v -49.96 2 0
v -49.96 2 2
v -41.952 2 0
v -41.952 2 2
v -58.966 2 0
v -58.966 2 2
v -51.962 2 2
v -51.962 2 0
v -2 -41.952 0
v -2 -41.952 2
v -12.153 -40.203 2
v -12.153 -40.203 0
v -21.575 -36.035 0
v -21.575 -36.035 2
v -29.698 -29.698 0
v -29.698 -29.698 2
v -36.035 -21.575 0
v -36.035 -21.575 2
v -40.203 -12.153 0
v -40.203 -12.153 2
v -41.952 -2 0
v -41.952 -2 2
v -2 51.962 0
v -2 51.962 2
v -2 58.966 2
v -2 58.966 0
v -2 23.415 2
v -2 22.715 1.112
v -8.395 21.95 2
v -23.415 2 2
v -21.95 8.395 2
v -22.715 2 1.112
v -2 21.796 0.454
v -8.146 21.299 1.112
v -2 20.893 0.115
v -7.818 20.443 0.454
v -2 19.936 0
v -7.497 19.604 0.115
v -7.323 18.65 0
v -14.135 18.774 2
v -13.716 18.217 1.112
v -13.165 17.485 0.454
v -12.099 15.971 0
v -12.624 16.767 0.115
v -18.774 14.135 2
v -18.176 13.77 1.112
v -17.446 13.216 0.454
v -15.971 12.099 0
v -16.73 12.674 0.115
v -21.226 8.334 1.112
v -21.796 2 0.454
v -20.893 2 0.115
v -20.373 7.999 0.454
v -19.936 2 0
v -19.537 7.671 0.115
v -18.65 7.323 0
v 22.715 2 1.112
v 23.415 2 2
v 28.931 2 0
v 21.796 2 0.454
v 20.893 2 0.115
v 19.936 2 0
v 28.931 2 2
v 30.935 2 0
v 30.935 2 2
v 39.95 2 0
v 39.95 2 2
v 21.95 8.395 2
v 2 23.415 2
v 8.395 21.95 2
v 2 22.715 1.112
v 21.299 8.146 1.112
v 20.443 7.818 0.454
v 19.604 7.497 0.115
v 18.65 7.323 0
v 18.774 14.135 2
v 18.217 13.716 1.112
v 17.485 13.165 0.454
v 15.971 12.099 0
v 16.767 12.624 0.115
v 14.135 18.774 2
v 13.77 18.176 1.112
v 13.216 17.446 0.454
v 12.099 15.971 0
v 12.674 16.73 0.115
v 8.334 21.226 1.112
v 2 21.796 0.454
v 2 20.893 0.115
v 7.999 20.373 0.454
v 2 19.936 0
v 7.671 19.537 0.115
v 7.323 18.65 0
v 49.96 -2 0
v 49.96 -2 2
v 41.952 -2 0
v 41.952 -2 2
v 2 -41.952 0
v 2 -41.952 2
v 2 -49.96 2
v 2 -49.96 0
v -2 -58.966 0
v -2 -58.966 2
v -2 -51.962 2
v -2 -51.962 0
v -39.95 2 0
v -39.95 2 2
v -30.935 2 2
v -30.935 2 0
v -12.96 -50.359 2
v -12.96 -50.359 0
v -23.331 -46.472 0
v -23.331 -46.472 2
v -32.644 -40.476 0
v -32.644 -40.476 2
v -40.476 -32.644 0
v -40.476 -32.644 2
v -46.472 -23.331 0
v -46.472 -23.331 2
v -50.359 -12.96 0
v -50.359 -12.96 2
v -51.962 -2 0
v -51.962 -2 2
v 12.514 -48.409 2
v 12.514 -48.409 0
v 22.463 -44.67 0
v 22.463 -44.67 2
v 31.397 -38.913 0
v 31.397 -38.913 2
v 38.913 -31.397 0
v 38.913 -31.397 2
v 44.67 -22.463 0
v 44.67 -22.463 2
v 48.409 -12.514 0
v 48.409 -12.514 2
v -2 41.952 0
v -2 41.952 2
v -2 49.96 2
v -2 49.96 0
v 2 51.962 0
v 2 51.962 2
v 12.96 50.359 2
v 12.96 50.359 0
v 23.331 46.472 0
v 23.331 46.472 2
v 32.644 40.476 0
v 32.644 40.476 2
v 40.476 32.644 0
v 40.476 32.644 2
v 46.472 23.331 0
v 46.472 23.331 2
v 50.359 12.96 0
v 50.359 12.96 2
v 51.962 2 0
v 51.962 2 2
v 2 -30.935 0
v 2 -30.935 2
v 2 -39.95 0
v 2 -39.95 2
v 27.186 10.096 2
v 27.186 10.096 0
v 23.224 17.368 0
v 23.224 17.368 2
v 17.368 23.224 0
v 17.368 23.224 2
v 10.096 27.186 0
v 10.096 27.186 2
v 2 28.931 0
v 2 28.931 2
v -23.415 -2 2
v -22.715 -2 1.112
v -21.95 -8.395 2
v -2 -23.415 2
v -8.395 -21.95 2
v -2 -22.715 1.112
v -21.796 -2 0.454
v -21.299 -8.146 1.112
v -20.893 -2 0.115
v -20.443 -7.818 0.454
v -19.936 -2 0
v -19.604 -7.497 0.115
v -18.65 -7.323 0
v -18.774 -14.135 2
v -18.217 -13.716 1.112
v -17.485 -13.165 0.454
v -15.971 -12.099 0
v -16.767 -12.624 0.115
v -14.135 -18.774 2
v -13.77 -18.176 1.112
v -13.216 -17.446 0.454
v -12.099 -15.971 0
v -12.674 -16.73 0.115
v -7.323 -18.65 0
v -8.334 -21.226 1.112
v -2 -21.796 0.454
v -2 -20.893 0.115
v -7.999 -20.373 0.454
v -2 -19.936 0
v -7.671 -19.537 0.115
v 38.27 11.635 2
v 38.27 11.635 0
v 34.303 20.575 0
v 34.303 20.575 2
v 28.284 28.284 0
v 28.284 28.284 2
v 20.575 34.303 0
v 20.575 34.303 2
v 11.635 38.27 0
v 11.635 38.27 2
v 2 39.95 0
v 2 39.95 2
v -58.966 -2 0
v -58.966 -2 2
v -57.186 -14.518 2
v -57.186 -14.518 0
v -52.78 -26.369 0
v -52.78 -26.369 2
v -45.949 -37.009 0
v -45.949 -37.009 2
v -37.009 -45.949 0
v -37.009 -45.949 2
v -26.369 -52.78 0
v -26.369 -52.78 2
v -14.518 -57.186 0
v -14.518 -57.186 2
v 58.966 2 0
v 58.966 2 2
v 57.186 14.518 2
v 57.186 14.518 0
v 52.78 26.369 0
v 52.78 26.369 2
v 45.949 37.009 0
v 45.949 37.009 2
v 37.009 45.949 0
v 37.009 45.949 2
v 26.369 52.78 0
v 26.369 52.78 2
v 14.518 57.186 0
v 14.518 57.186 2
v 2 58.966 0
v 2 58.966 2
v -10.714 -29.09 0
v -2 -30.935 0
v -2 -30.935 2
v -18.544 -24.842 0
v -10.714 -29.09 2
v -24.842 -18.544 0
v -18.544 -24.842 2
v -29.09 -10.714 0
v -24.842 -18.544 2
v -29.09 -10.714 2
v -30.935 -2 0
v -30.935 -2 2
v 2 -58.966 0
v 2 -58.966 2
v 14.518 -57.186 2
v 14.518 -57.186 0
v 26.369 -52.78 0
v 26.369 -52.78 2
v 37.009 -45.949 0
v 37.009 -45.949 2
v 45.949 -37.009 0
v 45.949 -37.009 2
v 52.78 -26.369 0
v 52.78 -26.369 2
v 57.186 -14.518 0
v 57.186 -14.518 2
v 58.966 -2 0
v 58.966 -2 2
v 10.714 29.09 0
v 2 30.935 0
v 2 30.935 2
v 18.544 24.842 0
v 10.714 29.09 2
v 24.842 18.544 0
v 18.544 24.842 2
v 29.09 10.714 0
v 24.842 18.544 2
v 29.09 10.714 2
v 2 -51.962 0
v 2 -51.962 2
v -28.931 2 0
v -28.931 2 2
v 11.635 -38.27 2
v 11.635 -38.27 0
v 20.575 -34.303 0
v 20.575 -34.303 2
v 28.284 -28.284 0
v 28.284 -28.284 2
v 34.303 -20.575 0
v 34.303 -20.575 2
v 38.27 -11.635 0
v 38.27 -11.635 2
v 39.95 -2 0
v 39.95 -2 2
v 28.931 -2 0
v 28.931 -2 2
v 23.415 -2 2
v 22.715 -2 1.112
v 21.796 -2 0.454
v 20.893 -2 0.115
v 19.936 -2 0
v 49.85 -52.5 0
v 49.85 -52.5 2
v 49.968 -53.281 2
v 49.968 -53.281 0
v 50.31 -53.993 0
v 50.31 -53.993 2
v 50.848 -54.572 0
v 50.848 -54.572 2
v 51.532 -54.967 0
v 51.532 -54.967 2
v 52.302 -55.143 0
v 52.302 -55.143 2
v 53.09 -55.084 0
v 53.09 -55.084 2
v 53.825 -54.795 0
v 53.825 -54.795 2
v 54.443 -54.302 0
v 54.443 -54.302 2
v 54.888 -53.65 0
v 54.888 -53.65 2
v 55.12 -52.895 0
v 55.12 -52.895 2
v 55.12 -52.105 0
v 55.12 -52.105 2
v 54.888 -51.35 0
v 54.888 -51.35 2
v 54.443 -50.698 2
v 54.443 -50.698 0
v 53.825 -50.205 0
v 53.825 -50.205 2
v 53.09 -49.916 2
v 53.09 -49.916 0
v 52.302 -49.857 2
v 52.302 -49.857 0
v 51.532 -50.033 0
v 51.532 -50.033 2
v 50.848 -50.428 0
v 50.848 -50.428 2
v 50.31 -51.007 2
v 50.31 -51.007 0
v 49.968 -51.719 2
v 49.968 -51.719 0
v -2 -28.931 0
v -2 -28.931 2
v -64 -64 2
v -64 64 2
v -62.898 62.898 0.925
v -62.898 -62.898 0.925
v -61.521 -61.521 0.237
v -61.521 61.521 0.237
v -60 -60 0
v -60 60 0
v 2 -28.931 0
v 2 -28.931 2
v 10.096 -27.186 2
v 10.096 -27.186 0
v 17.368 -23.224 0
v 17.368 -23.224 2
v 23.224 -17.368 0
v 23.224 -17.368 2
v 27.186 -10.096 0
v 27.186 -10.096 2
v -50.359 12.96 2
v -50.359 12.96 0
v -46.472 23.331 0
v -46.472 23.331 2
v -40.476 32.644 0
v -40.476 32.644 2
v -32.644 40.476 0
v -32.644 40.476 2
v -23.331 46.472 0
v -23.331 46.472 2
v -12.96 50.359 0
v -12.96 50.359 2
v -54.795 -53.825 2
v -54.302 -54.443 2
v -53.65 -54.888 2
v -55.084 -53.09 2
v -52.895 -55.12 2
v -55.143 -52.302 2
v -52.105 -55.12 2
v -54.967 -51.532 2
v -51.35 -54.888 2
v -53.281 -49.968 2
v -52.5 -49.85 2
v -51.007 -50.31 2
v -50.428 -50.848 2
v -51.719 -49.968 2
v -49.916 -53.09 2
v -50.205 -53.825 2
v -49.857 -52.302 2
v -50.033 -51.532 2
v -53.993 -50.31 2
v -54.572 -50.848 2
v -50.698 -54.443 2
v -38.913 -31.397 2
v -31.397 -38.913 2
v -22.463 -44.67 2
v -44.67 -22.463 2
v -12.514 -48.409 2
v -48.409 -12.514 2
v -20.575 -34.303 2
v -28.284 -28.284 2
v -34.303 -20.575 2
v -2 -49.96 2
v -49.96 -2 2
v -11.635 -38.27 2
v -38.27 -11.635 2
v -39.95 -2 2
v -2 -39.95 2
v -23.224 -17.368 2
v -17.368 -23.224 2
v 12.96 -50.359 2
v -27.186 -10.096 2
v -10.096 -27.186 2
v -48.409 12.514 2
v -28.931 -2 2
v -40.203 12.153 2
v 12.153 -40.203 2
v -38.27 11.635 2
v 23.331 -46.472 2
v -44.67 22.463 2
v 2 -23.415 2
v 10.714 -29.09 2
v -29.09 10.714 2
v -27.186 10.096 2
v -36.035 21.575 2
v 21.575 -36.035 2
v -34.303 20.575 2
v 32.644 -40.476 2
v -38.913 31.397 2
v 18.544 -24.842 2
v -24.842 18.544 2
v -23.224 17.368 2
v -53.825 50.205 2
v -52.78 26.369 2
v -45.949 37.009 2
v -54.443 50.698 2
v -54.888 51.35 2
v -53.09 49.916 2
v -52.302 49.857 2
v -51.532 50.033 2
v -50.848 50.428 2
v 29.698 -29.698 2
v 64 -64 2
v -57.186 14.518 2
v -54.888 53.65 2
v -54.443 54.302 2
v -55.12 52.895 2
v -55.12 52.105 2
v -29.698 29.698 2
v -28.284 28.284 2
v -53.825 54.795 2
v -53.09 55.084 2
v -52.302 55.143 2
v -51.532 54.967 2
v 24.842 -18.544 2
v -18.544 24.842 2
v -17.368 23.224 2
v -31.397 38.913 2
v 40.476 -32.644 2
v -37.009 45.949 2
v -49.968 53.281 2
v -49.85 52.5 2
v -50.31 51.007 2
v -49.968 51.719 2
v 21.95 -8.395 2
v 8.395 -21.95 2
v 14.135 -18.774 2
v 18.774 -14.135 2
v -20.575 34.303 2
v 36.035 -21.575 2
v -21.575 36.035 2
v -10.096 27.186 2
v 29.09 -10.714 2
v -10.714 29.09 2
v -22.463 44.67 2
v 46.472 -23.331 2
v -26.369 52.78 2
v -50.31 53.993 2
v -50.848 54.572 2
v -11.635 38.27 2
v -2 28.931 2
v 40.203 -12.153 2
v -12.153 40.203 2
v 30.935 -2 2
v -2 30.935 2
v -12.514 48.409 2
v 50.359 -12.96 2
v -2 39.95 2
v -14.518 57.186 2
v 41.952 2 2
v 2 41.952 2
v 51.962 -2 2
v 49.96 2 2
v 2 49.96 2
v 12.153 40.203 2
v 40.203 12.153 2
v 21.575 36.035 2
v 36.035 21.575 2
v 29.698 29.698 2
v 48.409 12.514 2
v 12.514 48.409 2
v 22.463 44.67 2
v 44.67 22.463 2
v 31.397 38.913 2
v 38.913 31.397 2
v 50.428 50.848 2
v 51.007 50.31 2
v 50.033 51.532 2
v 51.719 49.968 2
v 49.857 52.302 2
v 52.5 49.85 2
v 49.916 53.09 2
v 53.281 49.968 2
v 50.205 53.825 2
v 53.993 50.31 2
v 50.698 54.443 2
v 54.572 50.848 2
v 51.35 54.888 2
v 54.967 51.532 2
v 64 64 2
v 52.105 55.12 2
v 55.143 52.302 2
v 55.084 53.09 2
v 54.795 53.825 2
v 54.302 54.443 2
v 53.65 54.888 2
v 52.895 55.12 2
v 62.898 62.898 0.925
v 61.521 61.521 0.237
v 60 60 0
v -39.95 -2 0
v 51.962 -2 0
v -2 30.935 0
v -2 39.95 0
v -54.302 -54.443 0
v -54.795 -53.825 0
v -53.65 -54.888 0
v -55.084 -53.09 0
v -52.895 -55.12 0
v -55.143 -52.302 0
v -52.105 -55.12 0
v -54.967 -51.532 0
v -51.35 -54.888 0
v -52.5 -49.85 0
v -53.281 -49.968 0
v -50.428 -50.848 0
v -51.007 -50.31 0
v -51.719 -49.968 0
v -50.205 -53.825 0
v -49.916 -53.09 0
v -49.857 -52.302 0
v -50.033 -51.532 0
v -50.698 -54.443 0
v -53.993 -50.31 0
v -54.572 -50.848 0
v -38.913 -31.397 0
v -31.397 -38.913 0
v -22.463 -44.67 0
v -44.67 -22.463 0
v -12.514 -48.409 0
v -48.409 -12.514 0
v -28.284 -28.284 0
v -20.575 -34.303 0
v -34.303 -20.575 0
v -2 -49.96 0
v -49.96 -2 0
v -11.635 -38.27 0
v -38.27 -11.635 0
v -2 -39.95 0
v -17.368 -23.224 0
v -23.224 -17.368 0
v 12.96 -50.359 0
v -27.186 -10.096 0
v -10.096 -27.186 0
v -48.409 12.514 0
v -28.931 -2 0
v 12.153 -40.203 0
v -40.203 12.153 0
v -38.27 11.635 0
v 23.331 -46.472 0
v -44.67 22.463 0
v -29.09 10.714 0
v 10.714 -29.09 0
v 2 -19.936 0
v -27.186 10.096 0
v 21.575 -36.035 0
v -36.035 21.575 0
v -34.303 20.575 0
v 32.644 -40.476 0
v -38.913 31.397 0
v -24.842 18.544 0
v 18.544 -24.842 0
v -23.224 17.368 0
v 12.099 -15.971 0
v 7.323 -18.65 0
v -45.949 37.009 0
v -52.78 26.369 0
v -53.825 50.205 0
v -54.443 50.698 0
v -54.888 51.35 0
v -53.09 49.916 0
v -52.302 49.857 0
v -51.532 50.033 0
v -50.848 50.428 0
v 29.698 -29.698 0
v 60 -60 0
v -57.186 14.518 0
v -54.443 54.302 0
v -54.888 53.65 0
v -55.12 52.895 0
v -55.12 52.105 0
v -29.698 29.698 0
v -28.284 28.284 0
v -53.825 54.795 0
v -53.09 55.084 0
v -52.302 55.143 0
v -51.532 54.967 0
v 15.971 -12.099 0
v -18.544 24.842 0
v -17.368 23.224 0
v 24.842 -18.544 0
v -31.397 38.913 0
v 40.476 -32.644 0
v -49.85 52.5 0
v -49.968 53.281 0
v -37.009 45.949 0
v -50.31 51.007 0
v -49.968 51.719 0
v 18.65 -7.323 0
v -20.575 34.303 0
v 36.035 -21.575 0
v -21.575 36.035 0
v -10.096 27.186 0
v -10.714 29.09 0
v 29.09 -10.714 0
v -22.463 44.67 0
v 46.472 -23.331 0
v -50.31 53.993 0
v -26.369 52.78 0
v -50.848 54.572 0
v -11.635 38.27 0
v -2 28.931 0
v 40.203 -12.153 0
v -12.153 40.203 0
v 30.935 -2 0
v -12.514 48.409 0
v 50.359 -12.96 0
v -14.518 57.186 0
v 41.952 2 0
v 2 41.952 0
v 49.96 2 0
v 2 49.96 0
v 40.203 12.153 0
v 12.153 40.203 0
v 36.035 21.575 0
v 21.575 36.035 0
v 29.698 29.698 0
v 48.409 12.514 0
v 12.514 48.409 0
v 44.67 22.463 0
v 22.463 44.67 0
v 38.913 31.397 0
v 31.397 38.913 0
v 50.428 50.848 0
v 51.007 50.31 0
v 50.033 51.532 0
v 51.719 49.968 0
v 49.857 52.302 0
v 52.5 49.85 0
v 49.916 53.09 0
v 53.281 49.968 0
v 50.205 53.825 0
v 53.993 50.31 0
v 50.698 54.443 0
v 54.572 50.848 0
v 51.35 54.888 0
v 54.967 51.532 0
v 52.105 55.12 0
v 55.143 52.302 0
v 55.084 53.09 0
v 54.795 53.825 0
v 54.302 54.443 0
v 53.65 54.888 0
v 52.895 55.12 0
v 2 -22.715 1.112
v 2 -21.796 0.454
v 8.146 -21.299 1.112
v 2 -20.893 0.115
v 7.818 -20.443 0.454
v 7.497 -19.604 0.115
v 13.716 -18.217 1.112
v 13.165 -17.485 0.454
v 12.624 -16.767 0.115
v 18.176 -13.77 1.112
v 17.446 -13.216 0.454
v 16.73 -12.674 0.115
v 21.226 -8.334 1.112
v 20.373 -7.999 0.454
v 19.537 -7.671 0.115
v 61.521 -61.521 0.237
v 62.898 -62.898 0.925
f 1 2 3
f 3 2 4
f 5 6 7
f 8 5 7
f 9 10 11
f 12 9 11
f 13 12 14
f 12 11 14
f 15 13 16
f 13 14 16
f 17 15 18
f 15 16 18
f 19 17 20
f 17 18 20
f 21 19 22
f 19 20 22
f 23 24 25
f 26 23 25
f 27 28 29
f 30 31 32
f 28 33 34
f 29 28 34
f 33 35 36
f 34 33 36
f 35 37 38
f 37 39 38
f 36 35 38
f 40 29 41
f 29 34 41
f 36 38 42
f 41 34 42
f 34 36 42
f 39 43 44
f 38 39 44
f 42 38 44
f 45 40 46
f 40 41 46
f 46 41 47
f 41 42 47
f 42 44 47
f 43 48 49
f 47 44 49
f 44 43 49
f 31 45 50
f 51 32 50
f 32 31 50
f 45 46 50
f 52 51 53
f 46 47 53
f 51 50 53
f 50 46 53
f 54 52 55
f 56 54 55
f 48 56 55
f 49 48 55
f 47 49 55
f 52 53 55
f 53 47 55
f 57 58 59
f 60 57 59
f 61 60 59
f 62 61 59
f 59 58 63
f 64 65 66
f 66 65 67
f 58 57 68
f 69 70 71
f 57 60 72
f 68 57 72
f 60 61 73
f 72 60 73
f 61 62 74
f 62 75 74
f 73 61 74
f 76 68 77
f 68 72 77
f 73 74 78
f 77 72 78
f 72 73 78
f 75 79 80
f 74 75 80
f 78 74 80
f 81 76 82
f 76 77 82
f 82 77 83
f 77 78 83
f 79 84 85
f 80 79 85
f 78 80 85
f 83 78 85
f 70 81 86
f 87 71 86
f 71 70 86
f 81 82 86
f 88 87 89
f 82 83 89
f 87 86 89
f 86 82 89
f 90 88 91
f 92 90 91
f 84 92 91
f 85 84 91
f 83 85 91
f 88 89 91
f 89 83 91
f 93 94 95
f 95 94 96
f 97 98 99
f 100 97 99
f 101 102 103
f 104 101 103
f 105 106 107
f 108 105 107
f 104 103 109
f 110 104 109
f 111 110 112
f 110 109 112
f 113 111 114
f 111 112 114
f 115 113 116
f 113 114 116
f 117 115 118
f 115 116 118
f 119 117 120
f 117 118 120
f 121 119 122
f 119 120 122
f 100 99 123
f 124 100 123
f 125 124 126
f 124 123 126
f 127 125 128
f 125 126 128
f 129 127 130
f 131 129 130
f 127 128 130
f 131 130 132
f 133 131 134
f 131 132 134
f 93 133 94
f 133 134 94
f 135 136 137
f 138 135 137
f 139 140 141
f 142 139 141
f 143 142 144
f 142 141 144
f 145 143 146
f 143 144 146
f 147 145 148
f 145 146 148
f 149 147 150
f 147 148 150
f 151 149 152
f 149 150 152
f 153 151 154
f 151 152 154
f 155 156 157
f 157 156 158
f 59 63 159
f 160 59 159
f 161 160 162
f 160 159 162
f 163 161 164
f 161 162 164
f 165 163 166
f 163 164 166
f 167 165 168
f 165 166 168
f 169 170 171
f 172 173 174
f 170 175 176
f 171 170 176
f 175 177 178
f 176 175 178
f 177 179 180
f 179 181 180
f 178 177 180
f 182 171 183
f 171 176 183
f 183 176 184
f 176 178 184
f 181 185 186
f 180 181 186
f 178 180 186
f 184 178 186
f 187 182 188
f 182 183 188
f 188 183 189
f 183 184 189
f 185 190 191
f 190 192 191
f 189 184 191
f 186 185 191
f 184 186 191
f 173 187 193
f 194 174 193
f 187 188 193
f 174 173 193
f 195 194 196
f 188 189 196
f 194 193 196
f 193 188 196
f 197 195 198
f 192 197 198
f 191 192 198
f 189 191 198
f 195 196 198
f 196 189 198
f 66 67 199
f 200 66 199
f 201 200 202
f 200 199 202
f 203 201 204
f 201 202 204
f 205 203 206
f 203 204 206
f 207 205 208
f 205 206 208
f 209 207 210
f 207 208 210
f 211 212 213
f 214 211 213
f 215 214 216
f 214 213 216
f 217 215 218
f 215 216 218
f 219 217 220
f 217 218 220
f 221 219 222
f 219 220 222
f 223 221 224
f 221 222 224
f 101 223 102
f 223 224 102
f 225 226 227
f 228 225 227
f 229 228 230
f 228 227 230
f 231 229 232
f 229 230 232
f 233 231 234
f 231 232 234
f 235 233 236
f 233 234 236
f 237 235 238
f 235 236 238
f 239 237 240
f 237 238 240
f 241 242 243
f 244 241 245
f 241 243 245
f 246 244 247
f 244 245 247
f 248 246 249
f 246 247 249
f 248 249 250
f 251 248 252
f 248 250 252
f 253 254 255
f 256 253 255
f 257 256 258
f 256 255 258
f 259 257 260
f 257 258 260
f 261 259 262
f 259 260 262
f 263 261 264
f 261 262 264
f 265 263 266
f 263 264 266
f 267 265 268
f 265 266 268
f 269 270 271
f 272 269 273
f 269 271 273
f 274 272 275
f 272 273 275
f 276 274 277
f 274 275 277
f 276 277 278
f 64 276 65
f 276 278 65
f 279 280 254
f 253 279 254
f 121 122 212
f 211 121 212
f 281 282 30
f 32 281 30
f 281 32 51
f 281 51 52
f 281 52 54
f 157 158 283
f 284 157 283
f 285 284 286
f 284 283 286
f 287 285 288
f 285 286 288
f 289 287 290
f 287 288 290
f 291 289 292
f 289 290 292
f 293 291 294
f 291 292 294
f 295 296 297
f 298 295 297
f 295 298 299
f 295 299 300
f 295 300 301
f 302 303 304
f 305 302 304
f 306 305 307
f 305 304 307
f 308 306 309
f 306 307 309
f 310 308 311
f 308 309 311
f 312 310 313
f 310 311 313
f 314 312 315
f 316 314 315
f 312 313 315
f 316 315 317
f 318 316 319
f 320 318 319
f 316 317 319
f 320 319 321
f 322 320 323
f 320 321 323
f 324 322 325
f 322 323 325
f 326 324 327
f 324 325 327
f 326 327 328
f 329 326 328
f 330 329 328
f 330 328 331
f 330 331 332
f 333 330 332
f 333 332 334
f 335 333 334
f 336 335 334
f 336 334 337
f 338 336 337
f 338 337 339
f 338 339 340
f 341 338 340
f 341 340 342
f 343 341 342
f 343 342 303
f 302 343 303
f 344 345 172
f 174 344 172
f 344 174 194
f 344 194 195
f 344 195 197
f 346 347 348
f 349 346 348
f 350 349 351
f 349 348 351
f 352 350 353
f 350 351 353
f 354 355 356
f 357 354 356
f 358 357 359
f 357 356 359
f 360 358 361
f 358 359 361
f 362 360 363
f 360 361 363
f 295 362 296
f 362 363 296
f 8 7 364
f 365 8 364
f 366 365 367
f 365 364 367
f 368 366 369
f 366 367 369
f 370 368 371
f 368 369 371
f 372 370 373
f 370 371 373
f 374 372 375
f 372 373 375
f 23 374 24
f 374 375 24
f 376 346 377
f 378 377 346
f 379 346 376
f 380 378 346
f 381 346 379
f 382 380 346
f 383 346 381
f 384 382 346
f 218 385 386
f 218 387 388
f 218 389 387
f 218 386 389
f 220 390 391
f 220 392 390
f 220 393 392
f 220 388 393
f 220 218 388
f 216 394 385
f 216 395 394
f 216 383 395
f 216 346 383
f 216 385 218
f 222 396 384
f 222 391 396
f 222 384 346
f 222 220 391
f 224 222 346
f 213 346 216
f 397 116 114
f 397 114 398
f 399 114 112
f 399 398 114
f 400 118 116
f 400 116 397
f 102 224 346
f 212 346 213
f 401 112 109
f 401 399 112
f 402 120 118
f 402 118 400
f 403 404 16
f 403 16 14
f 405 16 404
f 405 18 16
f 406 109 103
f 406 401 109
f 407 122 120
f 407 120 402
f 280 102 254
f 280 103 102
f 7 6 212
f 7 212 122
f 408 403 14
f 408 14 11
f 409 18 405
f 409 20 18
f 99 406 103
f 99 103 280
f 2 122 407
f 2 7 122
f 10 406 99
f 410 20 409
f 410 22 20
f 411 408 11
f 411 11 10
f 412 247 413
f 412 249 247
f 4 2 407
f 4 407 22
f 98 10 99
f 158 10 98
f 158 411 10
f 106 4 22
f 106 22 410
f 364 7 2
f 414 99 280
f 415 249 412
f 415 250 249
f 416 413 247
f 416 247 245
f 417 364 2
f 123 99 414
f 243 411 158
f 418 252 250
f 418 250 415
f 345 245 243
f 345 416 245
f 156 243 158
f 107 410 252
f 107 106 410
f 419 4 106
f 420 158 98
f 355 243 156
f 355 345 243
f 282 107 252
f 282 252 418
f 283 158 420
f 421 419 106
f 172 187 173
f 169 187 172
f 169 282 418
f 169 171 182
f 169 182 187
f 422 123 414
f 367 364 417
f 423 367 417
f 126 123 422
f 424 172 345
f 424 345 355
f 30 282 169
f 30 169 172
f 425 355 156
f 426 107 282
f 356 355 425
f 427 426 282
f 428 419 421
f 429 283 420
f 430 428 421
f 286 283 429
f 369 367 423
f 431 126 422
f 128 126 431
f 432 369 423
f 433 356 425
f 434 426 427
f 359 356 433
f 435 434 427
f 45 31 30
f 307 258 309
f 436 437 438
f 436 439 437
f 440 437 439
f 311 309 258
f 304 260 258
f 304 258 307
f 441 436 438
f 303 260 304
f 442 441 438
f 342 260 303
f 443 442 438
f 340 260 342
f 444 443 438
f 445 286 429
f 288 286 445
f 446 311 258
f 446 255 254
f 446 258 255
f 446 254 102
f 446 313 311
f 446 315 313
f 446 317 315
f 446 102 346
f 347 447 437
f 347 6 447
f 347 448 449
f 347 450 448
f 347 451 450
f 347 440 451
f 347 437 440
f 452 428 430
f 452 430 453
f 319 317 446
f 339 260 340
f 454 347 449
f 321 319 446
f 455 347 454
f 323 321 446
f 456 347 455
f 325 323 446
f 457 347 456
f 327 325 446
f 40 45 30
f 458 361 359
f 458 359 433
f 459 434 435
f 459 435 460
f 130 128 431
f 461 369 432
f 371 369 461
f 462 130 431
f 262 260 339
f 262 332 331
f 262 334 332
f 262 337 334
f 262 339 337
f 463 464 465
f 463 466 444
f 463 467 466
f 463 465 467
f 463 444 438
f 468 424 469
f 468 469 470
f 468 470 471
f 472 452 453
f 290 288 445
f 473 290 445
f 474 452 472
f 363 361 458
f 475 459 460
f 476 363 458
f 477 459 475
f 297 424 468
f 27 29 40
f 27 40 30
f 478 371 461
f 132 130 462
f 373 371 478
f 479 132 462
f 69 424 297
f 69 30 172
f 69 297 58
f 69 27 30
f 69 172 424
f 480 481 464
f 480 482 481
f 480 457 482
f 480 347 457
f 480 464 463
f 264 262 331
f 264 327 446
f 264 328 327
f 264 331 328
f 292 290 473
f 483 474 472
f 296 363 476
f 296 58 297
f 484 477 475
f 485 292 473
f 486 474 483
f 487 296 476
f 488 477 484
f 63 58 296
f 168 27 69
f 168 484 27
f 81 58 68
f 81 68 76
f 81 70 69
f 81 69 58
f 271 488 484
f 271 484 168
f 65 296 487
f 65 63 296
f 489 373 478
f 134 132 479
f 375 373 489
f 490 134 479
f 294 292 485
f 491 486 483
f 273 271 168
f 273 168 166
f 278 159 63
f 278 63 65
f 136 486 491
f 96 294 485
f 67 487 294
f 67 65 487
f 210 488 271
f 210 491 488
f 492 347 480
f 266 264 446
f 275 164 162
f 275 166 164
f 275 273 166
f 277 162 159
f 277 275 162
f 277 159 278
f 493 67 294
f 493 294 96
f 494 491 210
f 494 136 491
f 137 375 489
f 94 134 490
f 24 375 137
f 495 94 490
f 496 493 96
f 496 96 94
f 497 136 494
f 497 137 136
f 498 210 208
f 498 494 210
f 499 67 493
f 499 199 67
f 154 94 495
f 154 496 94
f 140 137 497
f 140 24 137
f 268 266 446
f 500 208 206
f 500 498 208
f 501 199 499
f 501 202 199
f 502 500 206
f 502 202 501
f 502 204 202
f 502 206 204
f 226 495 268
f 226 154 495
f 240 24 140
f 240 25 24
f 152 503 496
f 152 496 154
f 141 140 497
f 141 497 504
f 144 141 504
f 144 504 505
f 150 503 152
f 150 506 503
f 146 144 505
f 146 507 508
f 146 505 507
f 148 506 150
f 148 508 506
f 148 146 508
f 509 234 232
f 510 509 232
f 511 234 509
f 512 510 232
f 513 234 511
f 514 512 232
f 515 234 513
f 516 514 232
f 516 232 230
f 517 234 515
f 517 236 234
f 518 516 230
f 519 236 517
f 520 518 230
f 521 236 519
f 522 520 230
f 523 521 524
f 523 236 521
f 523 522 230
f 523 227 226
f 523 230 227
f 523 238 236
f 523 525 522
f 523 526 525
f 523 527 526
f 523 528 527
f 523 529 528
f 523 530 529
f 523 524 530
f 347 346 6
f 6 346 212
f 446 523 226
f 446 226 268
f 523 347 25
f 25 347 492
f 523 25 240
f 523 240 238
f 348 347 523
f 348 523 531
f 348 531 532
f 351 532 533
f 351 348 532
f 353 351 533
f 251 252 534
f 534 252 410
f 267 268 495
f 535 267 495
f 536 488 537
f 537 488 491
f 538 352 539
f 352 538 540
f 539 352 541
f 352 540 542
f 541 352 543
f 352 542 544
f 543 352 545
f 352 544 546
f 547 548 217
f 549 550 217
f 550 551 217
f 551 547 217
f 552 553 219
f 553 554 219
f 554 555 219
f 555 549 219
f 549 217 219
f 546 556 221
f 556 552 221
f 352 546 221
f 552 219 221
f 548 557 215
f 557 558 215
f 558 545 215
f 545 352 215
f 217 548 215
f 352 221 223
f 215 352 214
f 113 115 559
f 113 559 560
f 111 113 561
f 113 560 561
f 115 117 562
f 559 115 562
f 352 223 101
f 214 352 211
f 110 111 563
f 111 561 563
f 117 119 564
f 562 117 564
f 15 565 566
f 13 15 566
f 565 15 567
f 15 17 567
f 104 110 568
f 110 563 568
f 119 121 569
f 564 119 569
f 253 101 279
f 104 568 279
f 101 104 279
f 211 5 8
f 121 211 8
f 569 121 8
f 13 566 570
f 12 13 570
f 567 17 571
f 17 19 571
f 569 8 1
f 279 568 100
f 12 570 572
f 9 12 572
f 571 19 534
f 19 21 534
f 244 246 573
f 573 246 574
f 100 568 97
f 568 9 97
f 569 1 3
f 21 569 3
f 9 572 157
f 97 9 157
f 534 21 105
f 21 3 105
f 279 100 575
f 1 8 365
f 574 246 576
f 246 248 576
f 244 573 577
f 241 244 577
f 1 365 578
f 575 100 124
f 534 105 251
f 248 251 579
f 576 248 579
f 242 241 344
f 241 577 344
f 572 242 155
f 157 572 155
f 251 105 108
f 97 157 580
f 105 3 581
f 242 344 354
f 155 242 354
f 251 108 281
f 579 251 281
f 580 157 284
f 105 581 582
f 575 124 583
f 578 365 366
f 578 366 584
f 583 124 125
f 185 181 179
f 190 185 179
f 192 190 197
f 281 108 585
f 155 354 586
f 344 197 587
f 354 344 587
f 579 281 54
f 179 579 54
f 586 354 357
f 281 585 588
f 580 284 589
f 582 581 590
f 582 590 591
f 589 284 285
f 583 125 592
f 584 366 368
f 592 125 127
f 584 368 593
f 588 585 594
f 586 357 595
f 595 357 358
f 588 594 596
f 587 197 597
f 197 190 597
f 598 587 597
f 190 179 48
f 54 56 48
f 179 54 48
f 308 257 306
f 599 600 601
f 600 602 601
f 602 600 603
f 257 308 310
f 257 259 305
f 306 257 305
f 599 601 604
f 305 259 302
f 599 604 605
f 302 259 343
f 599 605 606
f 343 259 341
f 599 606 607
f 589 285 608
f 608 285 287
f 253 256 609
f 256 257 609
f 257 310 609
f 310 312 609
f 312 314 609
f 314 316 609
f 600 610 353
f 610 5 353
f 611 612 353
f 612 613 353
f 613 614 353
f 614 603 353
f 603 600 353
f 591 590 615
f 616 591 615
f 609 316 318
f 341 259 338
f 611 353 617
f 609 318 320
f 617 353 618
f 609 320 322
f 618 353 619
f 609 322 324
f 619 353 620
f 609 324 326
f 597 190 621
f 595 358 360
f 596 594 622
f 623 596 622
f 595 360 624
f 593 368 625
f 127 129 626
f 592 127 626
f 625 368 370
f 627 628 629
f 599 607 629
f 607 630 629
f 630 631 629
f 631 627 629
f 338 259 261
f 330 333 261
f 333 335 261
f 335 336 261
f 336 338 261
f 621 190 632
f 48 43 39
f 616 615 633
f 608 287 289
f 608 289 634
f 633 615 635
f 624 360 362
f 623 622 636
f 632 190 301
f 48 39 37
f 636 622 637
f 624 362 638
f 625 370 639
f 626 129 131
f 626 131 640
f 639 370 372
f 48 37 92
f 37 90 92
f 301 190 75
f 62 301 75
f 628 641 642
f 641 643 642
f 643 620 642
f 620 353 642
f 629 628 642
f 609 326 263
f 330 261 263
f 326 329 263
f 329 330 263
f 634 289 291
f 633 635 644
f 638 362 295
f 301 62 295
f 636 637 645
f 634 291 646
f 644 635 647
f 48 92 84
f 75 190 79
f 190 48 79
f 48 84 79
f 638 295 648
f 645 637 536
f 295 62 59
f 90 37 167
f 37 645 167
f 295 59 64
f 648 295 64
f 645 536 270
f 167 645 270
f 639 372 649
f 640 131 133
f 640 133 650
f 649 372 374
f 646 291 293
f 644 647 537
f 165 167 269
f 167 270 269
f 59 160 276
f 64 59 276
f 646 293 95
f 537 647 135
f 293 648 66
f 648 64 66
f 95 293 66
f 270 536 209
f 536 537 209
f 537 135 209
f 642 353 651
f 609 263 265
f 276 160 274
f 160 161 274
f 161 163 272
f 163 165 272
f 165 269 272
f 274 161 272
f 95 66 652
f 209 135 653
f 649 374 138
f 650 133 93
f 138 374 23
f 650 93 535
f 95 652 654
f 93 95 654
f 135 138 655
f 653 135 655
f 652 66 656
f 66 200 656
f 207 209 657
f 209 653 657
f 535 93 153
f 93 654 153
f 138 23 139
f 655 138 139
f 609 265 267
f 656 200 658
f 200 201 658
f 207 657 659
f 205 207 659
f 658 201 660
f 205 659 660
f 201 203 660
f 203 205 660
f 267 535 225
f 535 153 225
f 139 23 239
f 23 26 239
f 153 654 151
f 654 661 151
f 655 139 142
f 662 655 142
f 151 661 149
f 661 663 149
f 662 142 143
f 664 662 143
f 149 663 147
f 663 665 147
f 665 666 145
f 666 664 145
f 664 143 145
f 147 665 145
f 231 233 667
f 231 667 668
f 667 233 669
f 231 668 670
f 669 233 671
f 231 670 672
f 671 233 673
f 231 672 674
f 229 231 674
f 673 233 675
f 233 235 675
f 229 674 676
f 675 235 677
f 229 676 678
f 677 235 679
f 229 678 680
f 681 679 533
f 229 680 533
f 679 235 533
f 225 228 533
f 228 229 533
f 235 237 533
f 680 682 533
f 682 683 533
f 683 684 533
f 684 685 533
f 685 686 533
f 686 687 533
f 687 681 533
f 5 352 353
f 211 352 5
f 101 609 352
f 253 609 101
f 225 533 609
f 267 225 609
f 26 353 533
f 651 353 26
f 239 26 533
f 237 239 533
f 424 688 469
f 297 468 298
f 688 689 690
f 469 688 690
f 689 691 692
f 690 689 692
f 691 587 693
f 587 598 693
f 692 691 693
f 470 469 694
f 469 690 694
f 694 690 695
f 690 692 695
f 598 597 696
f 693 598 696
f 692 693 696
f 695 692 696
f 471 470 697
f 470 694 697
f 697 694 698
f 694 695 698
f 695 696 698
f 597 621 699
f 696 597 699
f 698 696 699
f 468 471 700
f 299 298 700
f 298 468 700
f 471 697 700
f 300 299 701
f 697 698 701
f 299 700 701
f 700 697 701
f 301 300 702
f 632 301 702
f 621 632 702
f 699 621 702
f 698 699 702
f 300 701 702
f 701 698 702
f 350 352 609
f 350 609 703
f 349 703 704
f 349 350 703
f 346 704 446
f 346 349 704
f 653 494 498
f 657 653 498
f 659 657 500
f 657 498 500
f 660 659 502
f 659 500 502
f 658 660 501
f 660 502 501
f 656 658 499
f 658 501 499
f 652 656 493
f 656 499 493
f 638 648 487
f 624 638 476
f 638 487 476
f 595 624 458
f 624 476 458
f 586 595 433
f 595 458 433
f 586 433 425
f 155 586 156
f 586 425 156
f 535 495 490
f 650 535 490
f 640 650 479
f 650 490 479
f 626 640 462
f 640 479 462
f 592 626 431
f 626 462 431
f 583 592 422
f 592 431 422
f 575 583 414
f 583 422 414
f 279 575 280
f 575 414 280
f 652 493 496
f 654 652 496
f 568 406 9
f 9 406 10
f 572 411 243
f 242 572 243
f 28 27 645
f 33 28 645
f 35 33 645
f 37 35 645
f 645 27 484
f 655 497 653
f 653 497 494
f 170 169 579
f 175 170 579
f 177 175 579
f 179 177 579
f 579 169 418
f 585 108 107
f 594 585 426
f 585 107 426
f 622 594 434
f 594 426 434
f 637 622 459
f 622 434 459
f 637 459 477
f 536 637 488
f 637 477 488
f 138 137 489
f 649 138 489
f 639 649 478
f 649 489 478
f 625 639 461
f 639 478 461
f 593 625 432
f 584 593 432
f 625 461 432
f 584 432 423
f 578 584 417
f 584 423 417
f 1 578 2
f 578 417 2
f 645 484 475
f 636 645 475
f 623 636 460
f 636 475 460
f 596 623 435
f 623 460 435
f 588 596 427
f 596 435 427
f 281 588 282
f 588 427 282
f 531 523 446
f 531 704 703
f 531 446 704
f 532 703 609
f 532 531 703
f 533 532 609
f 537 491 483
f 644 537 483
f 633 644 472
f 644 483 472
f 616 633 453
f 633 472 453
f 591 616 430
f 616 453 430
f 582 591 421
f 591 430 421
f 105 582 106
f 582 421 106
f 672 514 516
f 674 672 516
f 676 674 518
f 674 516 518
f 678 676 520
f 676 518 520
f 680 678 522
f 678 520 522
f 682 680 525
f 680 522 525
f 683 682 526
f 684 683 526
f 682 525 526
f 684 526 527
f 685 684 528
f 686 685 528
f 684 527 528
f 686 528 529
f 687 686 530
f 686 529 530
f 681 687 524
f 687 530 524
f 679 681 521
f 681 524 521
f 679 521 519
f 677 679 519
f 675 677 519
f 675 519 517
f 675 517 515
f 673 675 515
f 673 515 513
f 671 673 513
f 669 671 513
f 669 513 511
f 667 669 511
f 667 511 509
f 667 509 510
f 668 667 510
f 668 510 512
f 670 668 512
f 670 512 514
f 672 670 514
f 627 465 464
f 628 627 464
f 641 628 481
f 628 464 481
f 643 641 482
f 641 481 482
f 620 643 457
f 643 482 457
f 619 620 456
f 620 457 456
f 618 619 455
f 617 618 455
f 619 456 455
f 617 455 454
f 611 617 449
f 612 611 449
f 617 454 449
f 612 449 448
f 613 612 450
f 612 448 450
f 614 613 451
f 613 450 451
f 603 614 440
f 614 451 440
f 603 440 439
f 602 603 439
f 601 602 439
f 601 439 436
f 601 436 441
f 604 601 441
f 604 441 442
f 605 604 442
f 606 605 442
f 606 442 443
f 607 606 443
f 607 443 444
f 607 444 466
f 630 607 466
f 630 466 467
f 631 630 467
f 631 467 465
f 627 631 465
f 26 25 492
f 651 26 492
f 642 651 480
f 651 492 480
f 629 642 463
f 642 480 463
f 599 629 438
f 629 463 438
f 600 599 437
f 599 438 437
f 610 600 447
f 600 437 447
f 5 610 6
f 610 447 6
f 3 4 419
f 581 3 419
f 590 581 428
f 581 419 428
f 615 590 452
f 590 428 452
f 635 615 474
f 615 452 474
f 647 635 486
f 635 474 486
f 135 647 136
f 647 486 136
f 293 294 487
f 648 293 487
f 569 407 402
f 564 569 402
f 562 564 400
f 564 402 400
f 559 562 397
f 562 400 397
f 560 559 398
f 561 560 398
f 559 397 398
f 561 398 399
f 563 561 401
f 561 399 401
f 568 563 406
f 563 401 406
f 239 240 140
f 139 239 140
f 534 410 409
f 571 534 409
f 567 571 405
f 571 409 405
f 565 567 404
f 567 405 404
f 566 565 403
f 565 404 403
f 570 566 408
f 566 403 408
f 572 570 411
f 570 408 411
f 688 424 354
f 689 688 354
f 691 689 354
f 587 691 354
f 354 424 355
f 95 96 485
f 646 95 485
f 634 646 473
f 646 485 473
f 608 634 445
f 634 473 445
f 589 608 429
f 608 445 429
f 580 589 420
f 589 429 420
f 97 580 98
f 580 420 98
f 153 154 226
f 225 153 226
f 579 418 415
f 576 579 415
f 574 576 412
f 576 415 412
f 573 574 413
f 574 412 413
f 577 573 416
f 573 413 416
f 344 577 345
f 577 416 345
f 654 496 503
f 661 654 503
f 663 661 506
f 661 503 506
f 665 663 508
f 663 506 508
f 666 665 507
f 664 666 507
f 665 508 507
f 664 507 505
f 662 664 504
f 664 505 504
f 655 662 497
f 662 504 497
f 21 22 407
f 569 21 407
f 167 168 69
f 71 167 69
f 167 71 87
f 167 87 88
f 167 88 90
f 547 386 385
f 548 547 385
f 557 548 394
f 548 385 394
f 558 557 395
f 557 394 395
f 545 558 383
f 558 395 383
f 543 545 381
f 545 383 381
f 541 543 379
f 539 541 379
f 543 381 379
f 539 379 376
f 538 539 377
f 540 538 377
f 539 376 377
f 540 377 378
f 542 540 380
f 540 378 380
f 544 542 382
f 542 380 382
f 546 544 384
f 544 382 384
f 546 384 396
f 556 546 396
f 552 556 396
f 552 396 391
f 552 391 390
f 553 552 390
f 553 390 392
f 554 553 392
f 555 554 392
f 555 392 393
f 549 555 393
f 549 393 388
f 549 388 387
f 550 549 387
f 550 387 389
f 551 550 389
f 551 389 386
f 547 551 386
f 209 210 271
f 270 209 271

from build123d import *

# Parameters (mm, degrees)
F0_W            = 128
F0_H            = 128
F1_DEPTH        = 2
F3_DEPTH        = 25
F4_R            = 2.65
F5_DEPTH        = 25
F5_COPIES_COUNT = 4
F6_T1_DEPTH     = 148
F6_T3_DEPTH     = 148
F7_T4_ANGLE     = 122.478644554
F7_T9_ANGLE     = 122.478644554
F7_T15_ANGLE    = 122.478644554
F7_T20_ANGLE    = 122.478644554
F7_T25_ANGLE    = 122.478644554
F7_T31_ANGLE    = 122.478644554
F7_T36_ANGLE    = 122.478644554
F7_T41_ANGLE    = 122.478644554
F7_T47_ANGLE    = 122.478644554
F7_T52_ANGLE    = 122.478644554
F7_T57_ANGLE    = 122.478644554
F7_T63_ANGLE    = 122.478644554


# Not quite as in the source:
# - a fillet or chamfer that OpenCascade refuses, or shapes differently, is made with other operations: its cross-section is extruded or revolved along the edge and cut away or added
# - a pattern or mirror of a feature is missing from the dataset's text; its kind, count and spacing are read off the source's solid
# - a feature names something its author has since deleted; it is built from what else it names


with BuildPart() as f1:
    # F0 (on Top) → F1 (new body)
    with BuildSketch(Plane.XY):
        Rectangle(F0_W, F0_H)
    extrude(amount=F1_DEPTH)

    # F2 (on face) → F3 (cut)
    with BuildSketch(Plane.XY.offset(2)):
        with BuildLine():
            Line((51.9615242271, 2), (58.9660919512, 2))
            ThreePointArc((58.9660919512, 2), (41.71930009, 41.71930009), (2, 58.9660919512))
            Line((2, 58.9660919512), (2, 51.9615242271))
            ThreePointArc((2, 51.9615242271), (36.7695526217, 36.7695526217), (51.9615242271, 2))
        make_face()
        with BuildLine():
            Line((41.9523539268, 2), (49.9599839872, 2))
            ThreePointArc((49.9599839872, 2), (35.3553390593, 35.3553390593), (2, 49.9599839872))
            Line((2, 49.9599839872), (2, 41.9523539268))
            ThreePointArc((2, 41.9523539268), (29.6984848098, 29.6984848098), (41.9523539268, 2))
        make_face()
        with BuildLine():
            Line((30.9354165965, 2), (39.9499687109, 2))
            ThreePointArc((39.9499687109, 2), (28.2842712475, 28.2842712475), (2, 39.9499687109))
            Line((2, 39.9499687109), (2, 30.9354165965))
            ThreePointArc((2, 30.9354165965), (21.9203102168, 21.9203102168), (30.9354165965, 2))
        make_face()
        with BuildLine():
            Line((23.4147389479, 2), (28.930952283, 2))
            ThreePointArc((28.930952283, 2), (20.5060966544, 20.5060966544), (2, 28.930952283))
            Line((2, 28.930952283), (2, 23.4147389479))
            ThreePointArc((2, 23.4147389479), (16.6170093579, 16.6170093579), (23.4147389479, 2))
        make_face()
        with BuildLine():
            ThreePointArc((2, -28.930952283), (20.5060966544, -20.5060966544), (28.930952283, -2))
            Line((28.930952283, -2), (23.4147389479, -2))
            ThreePointArc((23.4147389479, -2), (16.6170093579, -16.6170093579), (2, -23.4147389479))
            Line((2, -23.4147389479), (2, -28.930952283))
        make_face()
        with BuildLine():
            ThreePointArc((2, -39.9499687109), (28.2842712475, -28.2842712475), (39.9499687109, -2))
            Line((39.9499687109, -2), (30.9354165965, -2))
            ThreePointArc((30.9354165965, -2), (21.9203102168, -21.9203102168), (2, -30.9354165965))
            Line((2, -30.9354165965), (2, -39.9499687109))
        make_face()
        with BuildLine():
            ThreePointArc((2, -49.9599839872), (35.3553390593, -35.3553390593), (49.9599839872, -2))
            Line((49.9599839872, -2), (41.9523539268, -2))
            ThreePointArc((41.9523539268, -2), (29.6984848098, -29.6984848098), (2, -41.9523539268))
            Line((2, -41.9523539268), (2, -49.9599839872))
        make_face()
        with BuildLine():
            ThreePointArc((2, -58.9660919512), (41.71930009, -41.71930009), (58.9660919512, -2))
            Line((58.9660919512, -2), (51.9615242271, -2))
            ThreePointArc((51.9615242271, -2), (36.7695526217, -36.7695526217), (2, -51.9615242271))
            Line((2, -51.9615242271), (2, -58.9660919512))
        make_face()
        with BuildLine():
            ThreePointArc((-28.930952283, -2), (-20.5060966544, -20.5060966544), (-2, -28.930952283))
            Line((-2, -28.930952283), (-2, -23.4147389479))
            ThreePointArc((-2, -23.4147389479), (-16.6170093579, -16.6170093579), (-23.4147389479, -2))
            Line((-23.4147389479, -2), (-28.930952283, -2))
        make_face()
        with BuildLine():
            ThreePointArc((-39.9499687109, -2), (-28.2842712475, -28.2842712475), (-2, -39.9499687109))
            Line((-2, -39.9499687109), (-2, -30.9354165965))
            ThreePointArc((-2, -30.9354165965), (-21.9203102168, -21.9203102168), (-30.9354165965, -2))
            Line((-30.9354165965, -2), (-39.9499687109, -2))
        make_face()
        with BuildLine():
            ThreePointArc((-49.9599839872, -2), (-35.3553390593, -35.3553390593), (-2, -49.9599839872))
            Line((-2, -49.9599839872), (-2, -41.9523539268))
            ThreePointArc((-2, -41.9523539268), (-29.6984848098, -29.6984848098), (-41.9523539268, -2))
            Line((-41.9523539268, -2), (-49.9599839872, -2))
        make_face()
        with BuildLine():
            ThreePointArc((-58.9660919512, -2), (-41.71930009, -41.71930009), (-2, -58.9660919512))
            Line((-2, -58.9660919512), (-2, -51.9615242271))
            ThreePointArc((-2, -51.9615242271), (-36.7695526217, -36.7695526217), (-51.9615242271, -2))
            Line((-51.9615242271, -2), (-58.9660919512, -2))
        make_face()
        with BuildLine():
            Line((-2, 23.4147389479), (-2, 28.930952283))
            ThreePointArc((-2, 28.930952283), (-20.5060966544, 20.5060966544), (-28.930952283, 2))
            Line((-28.930952283, 2), (-23.4147389479, 2))
            ThreePointArc((-23.4147389479, 2), (-16.6170093579, 16.6170093579), (-2, 23.4147389479))
        make_face()
        with BuildLine():
            Line((-2, 30.9354165965), (-2, 39.9499687109))
            ThreePointArc((-2, 39.9499687109), (-28.2842712475, 28.2842712475), (-39.9499687109, 2))
            Line((-39.9499687109, 2), (-30.9354165965, 2))
            ThreePointArc((-30.9354165965, 2), (-21.9203102168, 21.9203102168), (-2, 30.9354165965))
        make_face()
        with BuildLine():
            Line((-2, 41.9523539268), (-2, 49.9599839872))
            ThreePointArc((-2, 49.9599839872), (-35.3553390593, 35.3553390593), (-49.9599839872, 2))
            Line((-49.9599839872, 2), (-41.9523539268, 2))
            ThreePointArc((-41.9523539268, 2), (-29.6984848098, 29.6984848098), (-2, 41.9523539268))
        make_face()
        with BuildLine():
            Line((-2, 51.9615242271), (-2, 58.9660919512))
            ThreePointArc((-2, 58.9660919512), (-41.71930009, 41.71930009), (-58.9660919512, 2))
            Line((-58.9660919512, 2), (-51.9615242271, 2))
            ThreePointArc((-51.9615242271, 2), (-36.7695526217, 36.7695526217), (-2, 51.9615242271))
        make_face()
    extrude(amount=-F3_DEPTH, mode=Mode.SUBTRACT)

    # F4 (on face) → F5 (cut)
    with BuildSketch(Plane.XY.offset(2)):
        with Locations((-52.5, 52.5)):
            Circle(F4_R)
    f5 = extrude(amount=-F5_DEPTH, mode=Mode.SUBTRACT)

    # F5_copies: F5 ×4 about axis
    f5_copies_axis = Axis((0, 0, 0), (0, 0, 1))
    for i in range(1, F5_COPIES_COUNT):
        add(f5.rotate(f5_copies_axis, i * 360 / F5_COPIES_COUNT), mode=Mode.SUBTRACT)

    # F6: fillet of radius 5 on 4 edges, made by hand

    # F6_s2 → F6_t1 (cut)
    with BuildSketch(Plane.YZ.offset(-74)):
        with BuildLine():
            ThreePointArc((-60, 0), (-62.2360679775, 0.527864045), (-64, 2))
            Line((-64, 2), (-64, 0))
            Line((-64, 0), (-60, 0))
        make_face()
        with BuildLine():
            ThreePointArc((64, 2), (62.2360679775, 0.527864045), (60, 0))
            Line((60, 0), (64, 0))
            Line((64, 0), (64, 2))
        make_face()
    extrude(amount=F6_T1_DEPTH, mode=Mode.SUBTRACT)

    # F6_s4 → F6_t3 (cut)
    with BuildSketch(Plane.XZ.offset(-74)):
        with BuildLine():
            ThreePointArc((-64, 2), (-62.2360679775, 0.527864045), (-60, 0))
            Line((-60, 0), (-64, 0))
            Line((-64, 0), (-64, 2))
        make_face()
        with BuildLine():
            ThreePointArc((64, 2), (62.2360679775, 0.527864045), (60, 0))
            Line((60, 0), (64, 0))
            Line((64, 0), (64, 2))
        make_face()
    extrude(amount=F6_T3_DEPTH, mode=Mode.SUBTRACT)

    # F7: fillet of radius 4 on 4 edges, made by hand


with BuildPart() as f7_tool2:
    # F7_s3 → F7_t4 (revolve)
    with BuildSketch(Plane(origin=(0, 0, 0), x_dir=(0, 0, 1), z_dir=(0.960101987, -0.2796500929, 0))):
        with BuildLine():
            ThreePointArc((2, -23.5), (0.5358983849, -22.0358983849), (0, -20.0358983849))
            Line((0, -20.0358983849), (0, -23.5))
            Line((0, -23.5), (2, -23.5))
        make_face()
    revolve(axis=Axis((0, 0, 0), (0, 0, 1)), revolution_arc=F7_T4_ANGLE)

    split(bisect_by=Plane.YZ.offset(2), keep=Keep.TOP)


with BuildPart() as f1_1:
    add(f1.part)

    # F7_t1: cut F7_tool2
    add(f7_tool2.part, mode=Mode.SUBTRACT)


with BuildPart() as f7_tool7:
    # F7_s8 → F7_t9 (revolve)
    with BuildSketch(Plane(origin=(0, 0, 0), x_dir=(0, 0, 1), z_dir=(0.960101987, -0.2796500929, 0))):
        with BuildLine():
            ThreePointArc((2, -23.5), (0.5358983849, -22.0358983849), (0, -20.0358983849))
            Line((0, -20.0358983849), (0, -23.5))
            Line((0, -23.5), (2, -23.5))
        make_face()
    revolve(axis=Axis((0, 0, 0), (0, 0, 1)), revolution_arc=F7_T9_ANGLE)

    split(bisect_by=Plane.YZ.offset(-2), keep=Keep.BOTTOM)

    split(bisect_by=Plane.XZ.offset(-2), keep=Keep.BOTTOM)


with BuildPart() as f1_2:
    add(f1_1.part)

    # F7_t6: cut F7_tool7
    add(f7_tool7.part, mode=Mode.SUBTRACT)


with BuildPart() as f7_tool13:
    # F7_s14 → F7_t15 (revolve)
    with BuildSketch(Plane(origin=(0, 0, 0), x_dir=(0, 0, 1), z_dir=(0.960101987, -0.2796500929, 0))):
        with BuildLine():
            ThreePointArc((2, -23.5), (0.5358983849, -22.0358983849), (0, -20.0358983849))
            Line((0, -20.0358983849), (0, -23.5))
            Line((0, -23.5), (2, -23.5))
        make_face()
    revolve(axis=Axis((0, 0, 0), (0, 0, 1)), revolution_arc=F7_T15_ANGLE)

    split(bisect_by=Plane.XZ.offset(2), keep=Keep.TOP)


with BuildPart() as f1_3:
    add(f1_2.part)

    # F7_t12: cut F7_tool13
    add(f7_tool13.part, mode=Mode.SUBTRACT)


with BuildPart() as f7_tool18:
    # F7_s19 → F7_t20 (revolve)
    with BuildSketch(Plane(origin=(0, 0, 0), x_dir=(0, 0, 1), z_dir=(-0.2796500929, -0.960101987, 0))):
        with BuildLine():
            ThreePointArc((2, -23.5), (0.5358983849, -22.0358983849), (0, -20.0358983849))
            Line((0, -20.0358983849), (0, -23.5))
            Line((0, -23.5), (2, -23.5))
        make_face()
    revolve(axis=Axis((0, 0, 0), (0, 0, 1)), revolution_arc=F7_T20_ANGLE)

    split(bisect_by=Plane.XZ.offset(2), keep=Keep.TOP)


with BuildPart() as f1_4:
    add(f1_3.part)

    # F7_t17: cut F7_tool18
    add(f7_tool18.part, mode=Mode.SUBTRACT)


with BuildPart() as f7_tool23:
    # F7_s24 → F7_t25 (revolve)
    with BuildSketch(Plane(origin=(0, 0, 0), x_dir=(0, 0, 1), z_dir=(-0.2796500929, -0.960101987, 0))):
        with BuildLine():
            ThreePointArc((2, -23.5), (0.5358983849, -22.0358983849), (0, -20.0358983849))
            Line((0, -20.0358983849), (0, -23.5))
            Line((0, -23.5), (2, -23.5))
        make_face()
    revolve(axis=Axis((0, 0, 0), (0, 0, 1)), revolution_arc=F7_T25_ANGLE)

    split(bisect_by=Plane.XZ.offset(-2), keep=Keep.BOTTOM)

    split(bisect_by=Plane.YZ.offset(2), keep=Keep.TOP)


with BuildPart() as f1_5:
    add(f1_4.part)

    # F7_t22: cut F7_tool23
    add(f7_tool23.part, mode=Mode.SUBTRACT)


with BuildPart() as f7_tool29:
    # F7_s30 → F7_t31 (revolve)
    with BuildSketch(Plane(origin=(0, 0, 0), x_dir=(0, 0, 1), z_dir=(-0.2796500929, -0.960101987, 0))):
        with BuildLine():
            ThreePointArc((2, -23.5), (0.5358983849, -22.0358983849), (0, -20.0358983849))
            Line((0, -20.0358983849), (0, -23.5))
            Line((0, -23.5), (2, -23.5))
        make_face()
    revolve(axis=Axis((0, 0, 0), (0, 0, 1)), revolution_arc=F7_T31_ANGLE)

    split(bisect_by=Plane.YZ.offset(-2), keep=Keep.BOTTOM)


with BuildPart() as f1_6:
    add(f1_5.part)

    # F7_t28: cut F7_tool29
    add(f7_tool29.part, mode=Mode.SUBTRACT)


with BuildPart() as f7_tool34:
    # F7_s35 → F7_t36 (revolve)
    with BuildSketch(Plane(origin=(0, 0, 0), x_dir=(0, 0, 1), z_dir=(-0.960101987, 0.2796500929, 0))):
        with BuildLine():
            ThreePointArc((2, -23.5), (0.5358983849, -22.0358983849), (0, -20.0358983849))
            Line((0, -20.0358983849), (0, -23.5))
            Line((0, -23.5), (2, -23.5))
        make_face()
    revolve(axis=Axis((0, 0, 0), (0, 0, 1)), revolution_arc=F7_T36_ANGLE)

    split(bisect_by=Plane.YZ.offset(-2), keep=Keep.BOTTOM)


with BuildPart() as f1_7:
    add(f1_6.part)

    # F7_t33: cut F7_tool34
    add(f7_tool34.part, mode=Mode.SUBTRACT)


with BuildPart() as f7_tool39:
    # F7_s40 → F7_t41 (revolve)
    with BuildSketch(Plane(origin=(0, 0, 0), x_dir=(0, 0, 1), z_dir=(-0.960101987, 0.2796500929, 0))):
        with BuildLine():
            ThreePointArc((2, -23.5), (0.5358983849, -22.0358983849), (0, -20.0358983849))
            Line((0, -20.0358983849), (0, -23.5))
            Line((0, -23.5), (2, -23.5))
        make_face()
    revolve(axis=Axis((0, 0, 0), (0, 0, 1)), revolution_arc=F7_T41_ANGLE)

    split(bisect_by=Plane.XZ.offset(2), keep=Keep.TOP)

    split(bisect_by=Plane.YZ.offset(2), keep=Keep.TOP)


with BuildPart() as f1_8:
    add(f1_7.part)

    # F7_t38: cut F7_tool39
    add(f7_tool39.part, mode=Mode.SUBTRACT)


with BuildPart() as f7_tool45:
    # F7_s46 → F7_t47 (revolve)
    with BuildSketch(Plane(origin=(0, 0, 0), x_dir=(0, 0, 1), z_dir=(-0.960101987, 0.2796500929, 0))):
        with BuildLine():
            ThreePointArc((2, -23.5), (0.5358983849, -22.0358983849), (0, -20.0358983849))
            Line((0, -20.0358983849), (0, -23.5))
            Line((0, -23.5), (2, -23.5))
        make_face()
    revolve(axis=Axis((0, 0, 0), (0, 0, 1)), revolution_arc=F7_T47_ANGLE)

    split(bisect_by=Plane.XZ.offset(-2), keep=Keep.BOTTOM)


with BuildPart() as f1_9:
    add(f1_8.part)

    # F7_t44: cut F7_tool45
    add(f7_tool45.part, mode=Mode.SUBTRACT)


with BuildPart() as f7_tool50:
    # F7_s51 → F7_t52 (revolve)
    with BuildSketch(Plane(origin=(0, 0, 0), x_dir=(0, 0, 1), z_dir=(0.2796500929, 0.960101987, 0))):
        with BuildLine():
            ThreePointArc((2, -23.5), (0.5358983849, -22.0358983849), (0, -20.0358983849))
            Line((0, -20.0358983849), (0, -23.5))
            Line((0, -23.5), (2, -23.5))
        make_face()
    revolve(axis=Axis((0, 0, 0), (0, 0, 1)), revolution_arc=F7_T52_ANGLE)

    split(bisect_by=Plane.XZ.offset(-2), keep=Keep.BOTTOM)


with BuildPart() as f1_10:
    add(f1_9.part)

    # F7_t49: cut F7_tool50
    add(f7_tool50.part, mode=Mode.SUBTRACT)


with BuildPart() as f7_tool55:
    # F7_s56 → F7_t57 (revolve)
    with BuildSketch(Plane(origin=(0, 0, 0), x_dir=(0, 0, 1), z_dir=(0.2796500929, 0.960101987, 0))):
        with BuildLine():
            ThreePointArc((2, -23.5), (0.5358983849, -22.0358983849), (0, -20.0358983849))
            Line((0, -20.0358983849), (0, -23.5))
            Line((0, -23.5), (2, -23.5))
        make_face()
    revolve(axis=Axis((0, 0, 0), (0, 0, 1)), revolution_arc=F7_T57_ANGLE)

    split(bisect_by=Plane.YZ.offset(-2), keep=Keep.BOTTOM)

    split(bisect_by=Plane.XZ.offset(2), keep=Keep.TOP)


with BuildPart() as f1_11:
    add(f1_10.part)

    # F7_t54: cut F7_tool55
    add(f7_tool55.part, mode=Mode.SUBTRACT)


with BuildPart() as f7_tool61:
    # F7_s62 → F7_t63 (revolve)
    with BuildSketch(Plane(origin=(0, 0, 0), x_dir=(0, 0, 1), z_dir=(0.2796500929, 0.960101987, 0))):
        with BuildLine():
            ThreePointArc((2, -23.5), (0.5358983849, -22.0358983849), (0, -20.0358983849))
            Line((0, -20.0358983849), (0, -23.5))
            Line((0, -23.5), (2, -23.5))
        make_face()
    revolve(axis=Axis((0, 0, 0), (0, 0, 1)), revolution_arc=F7_T63_ANGLE)

    split(bisect_by=Plane.YZ.offset(2), keep=Keep.TOP)


with BuildPart() as f1_12:
    add(f1_11.part)

    # F7_t60: cut F7_tool61
    add(f7_tool61.part, mode=Mode.SUBTRACT)


solid = f1_12.part
